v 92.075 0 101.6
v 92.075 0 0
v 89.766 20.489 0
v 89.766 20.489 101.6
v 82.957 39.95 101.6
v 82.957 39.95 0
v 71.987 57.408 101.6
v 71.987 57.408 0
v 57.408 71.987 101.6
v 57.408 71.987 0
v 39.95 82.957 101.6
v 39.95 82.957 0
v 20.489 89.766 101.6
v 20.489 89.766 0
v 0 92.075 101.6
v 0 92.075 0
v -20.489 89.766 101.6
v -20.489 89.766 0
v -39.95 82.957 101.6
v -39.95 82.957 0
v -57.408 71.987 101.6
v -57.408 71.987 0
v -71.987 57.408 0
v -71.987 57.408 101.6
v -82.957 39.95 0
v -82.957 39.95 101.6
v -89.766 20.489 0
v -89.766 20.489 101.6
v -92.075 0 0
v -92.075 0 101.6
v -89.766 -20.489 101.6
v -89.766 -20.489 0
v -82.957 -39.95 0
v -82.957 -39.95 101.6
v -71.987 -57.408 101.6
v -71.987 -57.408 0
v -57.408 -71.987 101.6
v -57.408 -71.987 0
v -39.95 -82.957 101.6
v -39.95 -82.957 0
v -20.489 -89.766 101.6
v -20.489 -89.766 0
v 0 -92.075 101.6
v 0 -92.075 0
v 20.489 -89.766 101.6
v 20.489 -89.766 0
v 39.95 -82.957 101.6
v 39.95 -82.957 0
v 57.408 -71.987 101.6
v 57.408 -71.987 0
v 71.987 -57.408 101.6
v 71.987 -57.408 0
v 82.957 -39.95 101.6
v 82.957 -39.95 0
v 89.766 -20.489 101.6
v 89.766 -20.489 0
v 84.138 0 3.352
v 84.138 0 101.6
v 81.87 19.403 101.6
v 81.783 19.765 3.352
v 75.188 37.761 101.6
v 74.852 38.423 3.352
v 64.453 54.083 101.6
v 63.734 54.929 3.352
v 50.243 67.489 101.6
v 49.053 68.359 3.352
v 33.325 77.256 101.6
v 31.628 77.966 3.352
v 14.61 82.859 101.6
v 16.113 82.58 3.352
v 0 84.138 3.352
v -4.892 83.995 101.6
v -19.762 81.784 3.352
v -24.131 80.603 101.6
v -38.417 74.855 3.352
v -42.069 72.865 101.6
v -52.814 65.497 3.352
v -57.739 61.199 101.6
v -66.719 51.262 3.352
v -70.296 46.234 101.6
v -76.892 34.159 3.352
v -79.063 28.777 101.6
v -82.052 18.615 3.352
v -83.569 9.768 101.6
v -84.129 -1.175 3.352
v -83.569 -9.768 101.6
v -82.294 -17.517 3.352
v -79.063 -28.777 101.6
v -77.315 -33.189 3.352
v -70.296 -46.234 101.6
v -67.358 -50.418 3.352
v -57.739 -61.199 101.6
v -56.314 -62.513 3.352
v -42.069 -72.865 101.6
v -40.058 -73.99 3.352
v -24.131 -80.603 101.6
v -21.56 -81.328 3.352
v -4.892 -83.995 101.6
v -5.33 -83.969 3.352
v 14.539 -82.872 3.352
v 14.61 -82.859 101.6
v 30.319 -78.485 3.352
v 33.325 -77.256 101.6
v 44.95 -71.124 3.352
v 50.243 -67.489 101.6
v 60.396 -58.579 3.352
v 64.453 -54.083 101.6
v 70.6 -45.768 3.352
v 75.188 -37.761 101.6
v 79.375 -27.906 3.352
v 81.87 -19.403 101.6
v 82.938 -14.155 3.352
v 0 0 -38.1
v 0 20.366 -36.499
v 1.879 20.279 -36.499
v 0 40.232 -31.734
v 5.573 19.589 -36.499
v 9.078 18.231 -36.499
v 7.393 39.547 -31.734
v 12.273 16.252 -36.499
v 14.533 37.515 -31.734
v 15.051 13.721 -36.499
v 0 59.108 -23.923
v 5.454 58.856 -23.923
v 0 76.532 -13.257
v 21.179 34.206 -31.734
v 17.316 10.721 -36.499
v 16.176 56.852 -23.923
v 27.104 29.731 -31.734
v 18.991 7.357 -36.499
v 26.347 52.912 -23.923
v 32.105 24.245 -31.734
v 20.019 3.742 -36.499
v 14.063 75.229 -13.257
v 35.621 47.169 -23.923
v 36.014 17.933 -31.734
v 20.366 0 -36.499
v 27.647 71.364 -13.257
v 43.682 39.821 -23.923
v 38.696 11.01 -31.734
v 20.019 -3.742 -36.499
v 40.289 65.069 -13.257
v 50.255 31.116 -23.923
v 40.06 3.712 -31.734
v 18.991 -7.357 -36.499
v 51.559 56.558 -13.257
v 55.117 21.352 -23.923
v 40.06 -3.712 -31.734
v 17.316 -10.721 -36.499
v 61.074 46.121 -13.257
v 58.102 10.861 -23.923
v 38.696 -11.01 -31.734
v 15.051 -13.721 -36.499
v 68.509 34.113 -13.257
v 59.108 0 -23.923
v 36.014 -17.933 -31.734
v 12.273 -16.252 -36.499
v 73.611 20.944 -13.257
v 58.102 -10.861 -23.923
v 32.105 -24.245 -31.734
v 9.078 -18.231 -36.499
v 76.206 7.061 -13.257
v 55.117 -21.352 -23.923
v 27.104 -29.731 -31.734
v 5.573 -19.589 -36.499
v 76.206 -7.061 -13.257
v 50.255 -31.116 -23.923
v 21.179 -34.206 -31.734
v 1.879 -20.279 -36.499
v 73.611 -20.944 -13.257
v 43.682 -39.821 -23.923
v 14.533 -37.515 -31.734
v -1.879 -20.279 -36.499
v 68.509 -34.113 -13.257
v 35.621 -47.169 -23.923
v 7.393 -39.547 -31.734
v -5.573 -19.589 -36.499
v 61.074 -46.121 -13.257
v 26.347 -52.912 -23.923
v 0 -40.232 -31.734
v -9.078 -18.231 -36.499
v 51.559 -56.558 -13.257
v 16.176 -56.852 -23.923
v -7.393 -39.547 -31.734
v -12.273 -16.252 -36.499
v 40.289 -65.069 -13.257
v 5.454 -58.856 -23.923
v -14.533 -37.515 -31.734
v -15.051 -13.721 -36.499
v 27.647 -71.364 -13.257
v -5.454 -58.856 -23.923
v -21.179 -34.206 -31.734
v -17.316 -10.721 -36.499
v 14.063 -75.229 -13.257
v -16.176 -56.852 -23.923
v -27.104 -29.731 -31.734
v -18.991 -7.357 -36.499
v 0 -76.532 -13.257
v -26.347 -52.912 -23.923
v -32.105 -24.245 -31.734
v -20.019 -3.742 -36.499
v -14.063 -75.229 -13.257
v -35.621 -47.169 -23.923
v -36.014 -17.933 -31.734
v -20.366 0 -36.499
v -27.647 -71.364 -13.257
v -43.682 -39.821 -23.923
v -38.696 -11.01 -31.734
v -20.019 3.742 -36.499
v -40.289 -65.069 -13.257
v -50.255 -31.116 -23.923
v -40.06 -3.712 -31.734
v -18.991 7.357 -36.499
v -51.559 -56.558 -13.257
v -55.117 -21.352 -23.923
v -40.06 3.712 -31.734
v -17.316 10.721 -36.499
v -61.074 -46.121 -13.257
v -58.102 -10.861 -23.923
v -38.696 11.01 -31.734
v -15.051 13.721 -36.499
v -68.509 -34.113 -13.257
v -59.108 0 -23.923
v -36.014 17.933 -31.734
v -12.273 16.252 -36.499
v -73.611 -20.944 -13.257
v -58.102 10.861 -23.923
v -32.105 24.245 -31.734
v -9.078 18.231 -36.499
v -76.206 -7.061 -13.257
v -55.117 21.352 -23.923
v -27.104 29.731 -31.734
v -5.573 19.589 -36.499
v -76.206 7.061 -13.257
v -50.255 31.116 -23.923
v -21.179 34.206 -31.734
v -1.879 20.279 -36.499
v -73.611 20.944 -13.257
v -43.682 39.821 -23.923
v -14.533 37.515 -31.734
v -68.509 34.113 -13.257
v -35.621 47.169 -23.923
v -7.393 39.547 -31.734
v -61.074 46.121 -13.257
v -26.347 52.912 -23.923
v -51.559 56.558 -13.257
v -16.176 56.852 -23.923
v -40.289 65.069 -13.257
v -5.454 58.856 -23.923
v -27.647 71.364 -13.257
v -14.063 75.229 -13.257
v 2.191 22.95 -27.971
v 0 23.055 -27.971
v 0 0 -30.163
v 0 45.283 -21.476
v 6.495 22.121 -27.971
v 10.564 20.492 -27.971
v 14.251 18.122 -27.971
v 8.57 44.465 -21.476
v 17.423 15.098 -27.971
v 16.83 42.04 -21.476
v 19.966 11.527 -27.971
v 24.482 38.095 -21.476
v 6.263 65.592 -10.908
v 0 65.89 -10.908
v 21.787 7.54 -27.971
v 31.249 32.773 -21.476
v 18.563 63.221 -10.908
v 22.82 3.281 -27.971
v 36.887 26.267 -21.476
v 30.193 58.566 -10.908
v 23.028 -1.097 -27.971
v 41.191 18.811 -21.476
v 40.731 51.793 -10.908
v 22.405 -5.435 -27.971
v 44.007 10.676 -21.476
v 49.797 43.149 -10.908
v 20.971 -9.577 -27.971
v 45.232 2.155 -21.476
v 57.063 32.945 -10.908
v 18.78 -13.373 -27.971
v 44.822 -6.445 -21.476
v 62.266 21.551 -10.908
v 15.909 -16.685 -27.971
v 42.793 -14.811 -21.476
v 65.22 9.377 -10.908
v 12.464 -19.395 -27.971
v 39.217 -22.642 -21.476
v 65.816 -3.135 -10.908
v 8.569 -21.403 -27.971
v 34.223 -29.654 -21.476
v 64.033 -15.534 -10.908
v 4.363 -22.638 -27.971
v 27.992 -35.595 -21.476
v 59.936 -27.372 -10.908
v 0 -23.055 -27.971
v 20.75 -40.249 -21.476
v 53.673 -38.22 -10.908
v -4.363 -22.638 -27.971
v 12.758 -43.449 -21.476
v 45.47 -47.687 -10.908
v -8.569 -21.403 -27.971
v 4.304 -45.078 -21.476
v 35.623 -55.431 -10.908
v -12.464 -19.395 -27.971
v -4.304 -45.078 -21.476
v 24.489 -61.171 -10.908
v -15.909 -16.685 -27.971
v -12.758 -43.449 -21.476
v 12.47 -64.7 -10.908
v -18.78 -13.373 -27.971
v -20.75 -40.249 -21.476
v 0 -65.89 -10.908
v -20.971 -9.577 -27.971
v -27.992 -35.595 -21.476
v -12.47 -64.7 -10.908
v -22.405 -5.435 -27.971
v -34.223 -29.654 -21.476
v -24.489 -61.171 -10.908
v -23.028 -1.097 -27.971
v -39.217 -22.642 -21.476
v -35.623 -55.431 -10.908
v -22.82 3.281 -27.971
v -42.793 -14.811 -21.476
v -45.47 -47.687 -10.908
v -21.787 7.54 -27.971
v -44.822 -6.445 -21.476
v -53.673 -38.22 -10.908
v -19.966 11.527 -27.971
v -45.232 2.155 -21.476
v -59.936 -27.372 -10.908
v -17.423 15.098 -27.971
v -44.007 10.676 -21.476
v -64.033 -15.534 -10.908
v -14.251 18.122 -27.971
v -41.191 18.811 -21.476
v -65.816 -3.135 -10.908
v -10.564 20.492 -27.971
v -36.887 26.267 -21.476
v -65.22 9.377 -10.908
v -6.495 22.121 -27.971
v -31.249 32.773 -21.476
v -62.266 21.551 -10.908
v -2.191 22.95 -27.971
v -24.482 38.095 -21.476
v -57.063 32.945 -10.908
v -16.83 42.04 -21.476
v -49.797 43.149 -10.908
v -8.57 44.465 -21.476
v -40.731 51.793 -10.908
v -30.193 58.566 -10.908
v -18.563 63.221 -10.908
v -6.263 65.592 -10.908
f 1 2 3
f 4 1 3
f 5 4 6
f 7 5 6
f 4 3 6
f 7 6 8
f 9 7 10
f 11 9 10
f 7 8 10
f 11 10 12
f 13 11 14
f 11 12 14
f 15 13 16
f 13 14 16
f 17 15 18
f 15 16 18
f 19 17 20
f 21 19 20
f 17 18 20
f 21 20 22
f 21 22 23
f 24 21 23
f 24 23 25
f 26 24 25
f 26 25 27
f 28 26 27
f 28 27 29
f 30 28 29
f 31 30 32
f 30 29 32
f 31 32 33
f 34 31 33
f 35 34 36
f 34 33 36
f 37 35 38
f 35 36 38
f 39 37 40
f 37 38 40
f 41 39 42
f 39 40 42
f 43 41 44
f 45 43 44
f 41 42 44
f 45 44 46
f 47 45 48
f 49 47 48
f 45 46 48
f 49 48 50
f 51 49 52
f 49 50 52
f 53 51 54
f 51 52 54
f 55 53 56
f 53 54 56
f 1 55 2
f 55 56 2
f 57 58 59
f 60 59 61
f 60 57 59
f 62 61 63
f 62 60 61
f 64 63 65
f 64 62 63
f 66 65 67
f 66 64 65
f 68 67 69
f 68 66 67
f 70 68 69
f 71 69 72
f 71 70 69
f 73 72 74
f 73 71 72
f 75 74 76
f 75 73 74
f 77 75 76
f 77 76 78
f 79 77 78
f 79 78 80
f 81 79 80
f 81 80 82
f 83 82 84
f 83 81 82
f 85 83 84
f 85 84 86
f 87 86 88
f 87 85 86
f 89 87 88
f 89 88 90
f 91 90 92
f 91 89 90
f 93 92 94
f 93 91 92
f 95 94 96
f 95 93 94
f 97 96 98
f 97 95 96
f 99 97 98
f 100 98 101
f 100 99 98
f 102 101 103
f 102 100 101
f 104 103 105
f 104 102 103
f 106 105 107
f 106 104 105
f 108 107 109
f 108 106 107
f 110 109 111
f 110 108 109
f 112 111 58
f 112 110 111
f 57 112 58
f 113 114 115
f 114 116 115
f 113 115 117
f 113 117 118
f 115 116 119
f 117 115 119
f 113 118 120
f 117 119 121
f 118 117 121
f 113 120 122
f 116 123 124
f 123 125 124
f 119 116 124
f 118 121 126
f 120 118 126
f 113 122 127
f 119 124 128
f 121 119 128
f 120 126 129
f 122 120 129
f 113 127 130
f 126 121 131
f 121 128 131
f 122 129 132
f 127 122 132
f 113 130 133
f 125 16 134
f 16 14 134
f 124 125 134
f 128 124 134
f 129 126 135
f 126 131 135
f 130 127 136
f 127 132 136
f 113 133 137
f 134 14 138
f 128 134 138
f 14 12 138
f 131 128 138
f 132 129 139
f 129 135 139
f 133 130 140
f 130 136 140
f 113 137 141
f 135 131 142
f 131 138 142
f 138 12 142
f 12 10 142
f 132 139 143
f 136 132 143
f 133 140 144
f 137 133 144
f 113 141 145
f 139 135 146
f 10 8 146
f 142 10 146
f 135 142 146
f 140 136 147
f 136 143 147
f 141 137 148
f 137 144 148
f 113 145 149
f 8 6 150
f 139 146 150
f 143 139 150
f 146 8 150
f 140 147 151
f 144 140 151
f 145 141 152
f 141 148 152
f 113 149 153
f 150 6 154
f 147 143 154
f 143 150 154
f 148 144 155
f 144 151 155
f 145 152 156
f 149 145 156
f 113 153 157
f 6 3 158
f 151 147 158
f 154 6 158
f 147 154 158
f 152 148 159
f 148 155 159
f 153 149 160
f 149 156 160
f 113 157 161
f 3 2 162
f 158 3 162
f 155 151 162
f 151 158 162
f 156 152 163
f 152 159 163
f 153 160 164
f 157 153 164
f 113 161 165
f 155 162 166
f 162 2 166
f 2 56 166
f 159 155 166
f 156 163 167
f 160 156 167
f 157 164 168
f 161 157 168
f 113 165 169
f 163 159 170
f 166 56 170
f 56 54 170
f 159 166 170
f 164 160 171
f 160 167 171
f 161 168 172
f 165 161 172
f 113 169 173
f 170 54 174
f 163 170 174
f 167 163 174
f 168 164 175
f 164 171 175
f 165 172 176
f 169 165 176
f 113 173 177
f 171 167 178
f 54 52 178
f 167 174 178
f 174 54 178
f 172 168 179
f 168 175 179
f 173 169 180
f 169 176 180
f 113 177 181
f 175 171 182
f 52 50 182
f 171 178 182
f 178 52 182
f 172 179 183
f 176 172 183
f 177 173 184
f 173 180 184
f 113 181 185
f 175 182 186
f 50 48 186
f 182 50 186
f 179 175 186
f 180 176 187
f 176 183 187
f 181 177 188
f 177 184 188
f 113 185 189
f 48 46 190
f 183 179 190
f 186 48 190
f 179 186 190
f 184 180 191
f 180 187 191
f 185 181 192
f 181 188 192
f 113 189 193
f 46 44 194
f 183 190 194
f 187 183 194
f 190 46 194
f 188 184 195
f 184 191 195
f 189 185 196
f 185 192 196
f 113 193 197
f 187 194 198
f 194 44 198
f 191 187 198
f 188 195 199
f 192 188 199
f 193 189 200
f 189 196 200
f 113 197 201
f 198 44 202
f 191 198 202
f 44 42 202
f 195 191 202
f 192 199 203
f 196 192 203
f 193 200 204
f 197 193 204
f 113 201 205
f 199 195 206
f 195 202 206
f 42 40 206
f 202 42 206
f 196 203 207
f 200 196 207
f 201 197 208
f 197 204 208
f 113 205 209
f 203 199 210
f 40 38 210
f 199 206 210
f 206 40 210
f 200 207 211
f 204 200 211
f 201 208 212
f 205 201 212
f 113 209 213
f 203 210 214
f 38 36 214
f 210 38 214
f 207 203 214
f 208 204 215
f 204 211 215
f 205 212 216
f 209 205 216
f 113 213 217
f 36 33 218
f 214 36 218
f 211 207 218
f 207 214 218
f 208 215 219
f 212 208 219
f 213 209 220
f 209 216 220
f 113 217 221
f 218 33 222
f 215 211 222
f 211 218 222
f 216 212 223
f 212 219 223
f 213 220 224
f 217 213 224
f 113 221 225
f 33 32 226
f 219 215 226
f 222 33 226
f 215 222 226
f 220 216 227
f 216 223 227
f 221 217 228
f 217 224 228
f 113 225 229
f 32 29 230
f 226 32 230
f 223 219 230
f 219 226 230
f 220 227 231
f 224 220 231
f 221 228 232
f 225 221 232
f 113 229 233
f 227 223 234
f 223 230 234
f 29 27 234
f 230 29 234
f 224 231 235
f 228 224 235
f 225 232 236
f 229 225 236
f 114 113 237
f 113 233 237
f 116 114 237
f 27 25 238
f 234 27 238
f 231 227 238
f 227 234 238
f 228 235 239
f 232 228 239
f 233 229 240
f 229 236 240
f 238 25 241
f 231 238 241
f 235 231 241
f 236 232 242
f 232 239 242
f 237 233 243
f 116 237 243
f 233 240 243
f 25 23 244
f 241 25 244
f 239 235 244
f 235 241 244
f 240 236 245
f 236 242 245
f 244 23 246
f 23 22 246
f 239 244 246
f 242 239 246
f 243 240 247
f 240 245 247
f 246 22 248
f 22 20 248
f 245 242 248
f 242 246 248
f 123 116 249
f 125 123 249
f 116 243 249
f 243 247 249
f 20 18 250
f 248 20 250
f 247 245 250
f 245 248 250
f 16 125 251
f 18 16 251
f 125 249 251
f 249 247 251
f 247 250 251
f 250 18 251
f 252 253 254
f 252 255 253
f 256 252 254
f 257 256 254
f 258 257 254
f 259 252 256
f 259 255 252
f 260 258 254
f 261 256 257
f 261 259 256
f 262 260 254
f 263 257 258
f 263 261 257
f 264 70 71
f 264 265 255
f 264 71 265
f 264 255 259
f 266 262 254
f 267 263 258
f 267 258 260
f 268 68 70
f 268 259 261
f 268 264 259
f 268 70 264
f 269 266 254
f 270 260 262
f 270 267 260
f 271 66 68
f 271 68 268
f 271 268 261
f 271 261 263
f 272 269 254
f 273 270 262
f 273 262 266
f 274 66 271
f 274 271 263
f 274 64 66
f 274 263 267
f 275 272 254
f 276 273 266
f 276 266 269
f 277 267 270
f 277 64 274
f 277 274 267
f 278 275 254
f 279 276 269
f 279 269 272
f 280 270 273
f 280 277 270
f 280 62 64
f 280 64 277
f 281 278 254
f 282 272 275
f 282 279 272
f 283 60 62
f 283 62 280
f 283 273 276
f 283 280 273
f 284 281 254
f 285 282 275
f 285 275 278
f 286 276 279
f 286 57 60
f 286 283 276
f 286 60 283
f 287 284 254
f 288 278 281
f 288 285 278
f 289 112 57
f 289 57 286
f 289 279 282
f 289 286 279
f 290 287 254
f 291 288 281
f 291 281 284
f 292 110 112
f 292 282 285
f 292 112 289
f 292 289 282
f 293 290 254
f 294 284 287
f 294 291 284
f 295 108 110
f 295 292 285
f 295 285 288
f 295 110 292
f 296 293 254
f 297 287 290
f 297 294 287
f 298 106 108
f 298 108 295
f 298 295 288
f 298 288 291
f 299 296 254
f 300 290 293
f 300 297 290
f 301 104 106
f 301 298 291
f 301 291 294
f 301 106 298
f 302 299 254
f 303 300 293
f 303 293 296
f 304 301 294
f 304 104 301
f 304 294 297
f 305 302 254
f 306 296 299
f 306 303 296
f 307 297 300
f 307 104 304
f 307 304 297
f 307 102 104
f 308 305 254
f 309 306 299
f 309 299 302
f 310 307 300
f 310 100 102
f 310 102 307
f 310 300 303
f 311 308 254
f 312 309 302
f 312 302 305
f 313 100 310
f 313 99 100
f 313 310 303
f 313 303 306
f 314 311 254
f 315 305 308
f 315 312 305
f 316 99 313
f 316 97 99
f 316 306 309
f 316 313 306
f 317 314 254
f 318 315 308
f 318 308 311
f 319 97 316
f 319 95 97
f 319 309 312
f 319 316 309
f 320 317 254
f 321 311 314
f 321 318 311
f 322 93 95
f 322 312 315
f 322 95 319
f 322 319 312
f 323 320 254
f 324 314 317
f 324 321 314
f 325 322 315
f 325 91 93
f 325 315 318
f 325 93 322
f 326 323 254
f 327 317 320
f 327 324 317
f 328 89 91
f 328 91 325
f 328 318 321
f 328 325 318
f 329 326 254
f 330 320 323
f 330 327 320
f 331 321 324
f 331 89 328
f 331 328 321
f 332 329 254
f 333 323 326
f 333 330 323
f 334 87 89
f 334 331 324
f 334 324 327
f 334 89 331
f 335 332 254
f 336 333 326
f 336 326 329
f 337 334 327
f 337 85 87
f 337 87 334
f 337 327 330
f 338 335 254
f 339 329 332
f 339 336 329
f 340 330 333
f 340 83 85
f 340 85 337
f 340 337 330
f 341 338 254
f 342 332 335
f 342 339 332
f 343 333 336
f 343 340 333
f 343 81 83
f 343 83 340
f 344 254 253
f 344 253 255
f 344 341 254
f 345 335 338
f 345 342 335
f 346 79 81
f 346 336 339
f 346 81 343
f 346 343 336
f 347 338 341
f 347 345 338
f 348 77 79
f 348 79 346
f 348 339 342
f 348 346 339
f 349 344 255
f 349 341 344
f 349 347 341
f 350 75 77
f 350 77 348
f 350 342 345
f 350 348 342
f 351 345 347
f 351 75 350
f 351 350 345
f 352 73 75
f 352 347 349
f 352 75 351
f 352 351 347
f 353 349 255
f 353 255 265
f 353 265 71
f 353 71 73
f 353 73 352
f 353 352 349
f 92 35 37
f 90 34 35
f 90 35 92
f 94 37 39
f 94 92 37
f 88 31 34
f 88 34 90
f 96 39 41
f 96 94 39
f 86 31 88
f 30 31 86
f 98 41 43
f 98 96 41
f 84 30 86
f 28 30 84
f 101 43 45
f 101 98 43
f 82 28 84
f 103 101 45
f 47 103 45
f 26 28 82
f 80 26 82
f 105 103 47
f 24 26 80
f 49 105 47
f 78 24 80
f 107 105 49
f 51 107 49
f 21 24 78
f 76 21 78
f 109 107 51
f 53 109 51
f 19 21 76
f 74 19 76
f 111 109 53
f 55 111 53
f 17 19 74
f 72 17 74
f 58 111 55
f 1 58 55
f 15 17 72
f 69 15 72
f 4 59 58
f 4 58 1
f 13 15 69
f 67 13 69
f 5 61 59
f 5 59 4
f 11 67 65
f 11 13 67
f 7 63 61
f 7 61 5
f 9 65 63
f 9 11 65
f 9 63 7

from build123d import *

# Parameters (mm, degrees)
SKETCH1_R           = 92.075
BOSS_EXTRUDE1_DEPTH = 101.6
SHELL1_T            = -7.9375


with BuildPart() as part:
    # Sketch1 → Boss-Extrude1 (new body)
    with BuildSketch(Plane.XY):
        Circle(SKETCH1_R)
    extrude(amount=BOSS_EXTRUDE1_DEPTH)

    # Sketch2 → Revolve1 (revolve)
    with BuildSketch(Plane(origin=(0, 0, 0), x_dir=(0, 0, -1), z_dir=(1, 0, 0))):
        with BuildLine():
            Line((0, 0), (38.1, 0))
            ThreePointArc((38.1, 0), (28.198839221, 49.823226574), (0, 92.075))
            Line((0, 92.075), (0, 0))
        make_face()
    revolve(axis=Axis((0, 0, 0), (0, 0, -1)))

    # Shell1
    shell1_openings = [part.faces().sort_by_distance(p)[0] for p in [
        (0, 0, 101.6),
    ]]
    offset(amount=SHELL1_T, openings=shell1_openings)


solid = part.part
